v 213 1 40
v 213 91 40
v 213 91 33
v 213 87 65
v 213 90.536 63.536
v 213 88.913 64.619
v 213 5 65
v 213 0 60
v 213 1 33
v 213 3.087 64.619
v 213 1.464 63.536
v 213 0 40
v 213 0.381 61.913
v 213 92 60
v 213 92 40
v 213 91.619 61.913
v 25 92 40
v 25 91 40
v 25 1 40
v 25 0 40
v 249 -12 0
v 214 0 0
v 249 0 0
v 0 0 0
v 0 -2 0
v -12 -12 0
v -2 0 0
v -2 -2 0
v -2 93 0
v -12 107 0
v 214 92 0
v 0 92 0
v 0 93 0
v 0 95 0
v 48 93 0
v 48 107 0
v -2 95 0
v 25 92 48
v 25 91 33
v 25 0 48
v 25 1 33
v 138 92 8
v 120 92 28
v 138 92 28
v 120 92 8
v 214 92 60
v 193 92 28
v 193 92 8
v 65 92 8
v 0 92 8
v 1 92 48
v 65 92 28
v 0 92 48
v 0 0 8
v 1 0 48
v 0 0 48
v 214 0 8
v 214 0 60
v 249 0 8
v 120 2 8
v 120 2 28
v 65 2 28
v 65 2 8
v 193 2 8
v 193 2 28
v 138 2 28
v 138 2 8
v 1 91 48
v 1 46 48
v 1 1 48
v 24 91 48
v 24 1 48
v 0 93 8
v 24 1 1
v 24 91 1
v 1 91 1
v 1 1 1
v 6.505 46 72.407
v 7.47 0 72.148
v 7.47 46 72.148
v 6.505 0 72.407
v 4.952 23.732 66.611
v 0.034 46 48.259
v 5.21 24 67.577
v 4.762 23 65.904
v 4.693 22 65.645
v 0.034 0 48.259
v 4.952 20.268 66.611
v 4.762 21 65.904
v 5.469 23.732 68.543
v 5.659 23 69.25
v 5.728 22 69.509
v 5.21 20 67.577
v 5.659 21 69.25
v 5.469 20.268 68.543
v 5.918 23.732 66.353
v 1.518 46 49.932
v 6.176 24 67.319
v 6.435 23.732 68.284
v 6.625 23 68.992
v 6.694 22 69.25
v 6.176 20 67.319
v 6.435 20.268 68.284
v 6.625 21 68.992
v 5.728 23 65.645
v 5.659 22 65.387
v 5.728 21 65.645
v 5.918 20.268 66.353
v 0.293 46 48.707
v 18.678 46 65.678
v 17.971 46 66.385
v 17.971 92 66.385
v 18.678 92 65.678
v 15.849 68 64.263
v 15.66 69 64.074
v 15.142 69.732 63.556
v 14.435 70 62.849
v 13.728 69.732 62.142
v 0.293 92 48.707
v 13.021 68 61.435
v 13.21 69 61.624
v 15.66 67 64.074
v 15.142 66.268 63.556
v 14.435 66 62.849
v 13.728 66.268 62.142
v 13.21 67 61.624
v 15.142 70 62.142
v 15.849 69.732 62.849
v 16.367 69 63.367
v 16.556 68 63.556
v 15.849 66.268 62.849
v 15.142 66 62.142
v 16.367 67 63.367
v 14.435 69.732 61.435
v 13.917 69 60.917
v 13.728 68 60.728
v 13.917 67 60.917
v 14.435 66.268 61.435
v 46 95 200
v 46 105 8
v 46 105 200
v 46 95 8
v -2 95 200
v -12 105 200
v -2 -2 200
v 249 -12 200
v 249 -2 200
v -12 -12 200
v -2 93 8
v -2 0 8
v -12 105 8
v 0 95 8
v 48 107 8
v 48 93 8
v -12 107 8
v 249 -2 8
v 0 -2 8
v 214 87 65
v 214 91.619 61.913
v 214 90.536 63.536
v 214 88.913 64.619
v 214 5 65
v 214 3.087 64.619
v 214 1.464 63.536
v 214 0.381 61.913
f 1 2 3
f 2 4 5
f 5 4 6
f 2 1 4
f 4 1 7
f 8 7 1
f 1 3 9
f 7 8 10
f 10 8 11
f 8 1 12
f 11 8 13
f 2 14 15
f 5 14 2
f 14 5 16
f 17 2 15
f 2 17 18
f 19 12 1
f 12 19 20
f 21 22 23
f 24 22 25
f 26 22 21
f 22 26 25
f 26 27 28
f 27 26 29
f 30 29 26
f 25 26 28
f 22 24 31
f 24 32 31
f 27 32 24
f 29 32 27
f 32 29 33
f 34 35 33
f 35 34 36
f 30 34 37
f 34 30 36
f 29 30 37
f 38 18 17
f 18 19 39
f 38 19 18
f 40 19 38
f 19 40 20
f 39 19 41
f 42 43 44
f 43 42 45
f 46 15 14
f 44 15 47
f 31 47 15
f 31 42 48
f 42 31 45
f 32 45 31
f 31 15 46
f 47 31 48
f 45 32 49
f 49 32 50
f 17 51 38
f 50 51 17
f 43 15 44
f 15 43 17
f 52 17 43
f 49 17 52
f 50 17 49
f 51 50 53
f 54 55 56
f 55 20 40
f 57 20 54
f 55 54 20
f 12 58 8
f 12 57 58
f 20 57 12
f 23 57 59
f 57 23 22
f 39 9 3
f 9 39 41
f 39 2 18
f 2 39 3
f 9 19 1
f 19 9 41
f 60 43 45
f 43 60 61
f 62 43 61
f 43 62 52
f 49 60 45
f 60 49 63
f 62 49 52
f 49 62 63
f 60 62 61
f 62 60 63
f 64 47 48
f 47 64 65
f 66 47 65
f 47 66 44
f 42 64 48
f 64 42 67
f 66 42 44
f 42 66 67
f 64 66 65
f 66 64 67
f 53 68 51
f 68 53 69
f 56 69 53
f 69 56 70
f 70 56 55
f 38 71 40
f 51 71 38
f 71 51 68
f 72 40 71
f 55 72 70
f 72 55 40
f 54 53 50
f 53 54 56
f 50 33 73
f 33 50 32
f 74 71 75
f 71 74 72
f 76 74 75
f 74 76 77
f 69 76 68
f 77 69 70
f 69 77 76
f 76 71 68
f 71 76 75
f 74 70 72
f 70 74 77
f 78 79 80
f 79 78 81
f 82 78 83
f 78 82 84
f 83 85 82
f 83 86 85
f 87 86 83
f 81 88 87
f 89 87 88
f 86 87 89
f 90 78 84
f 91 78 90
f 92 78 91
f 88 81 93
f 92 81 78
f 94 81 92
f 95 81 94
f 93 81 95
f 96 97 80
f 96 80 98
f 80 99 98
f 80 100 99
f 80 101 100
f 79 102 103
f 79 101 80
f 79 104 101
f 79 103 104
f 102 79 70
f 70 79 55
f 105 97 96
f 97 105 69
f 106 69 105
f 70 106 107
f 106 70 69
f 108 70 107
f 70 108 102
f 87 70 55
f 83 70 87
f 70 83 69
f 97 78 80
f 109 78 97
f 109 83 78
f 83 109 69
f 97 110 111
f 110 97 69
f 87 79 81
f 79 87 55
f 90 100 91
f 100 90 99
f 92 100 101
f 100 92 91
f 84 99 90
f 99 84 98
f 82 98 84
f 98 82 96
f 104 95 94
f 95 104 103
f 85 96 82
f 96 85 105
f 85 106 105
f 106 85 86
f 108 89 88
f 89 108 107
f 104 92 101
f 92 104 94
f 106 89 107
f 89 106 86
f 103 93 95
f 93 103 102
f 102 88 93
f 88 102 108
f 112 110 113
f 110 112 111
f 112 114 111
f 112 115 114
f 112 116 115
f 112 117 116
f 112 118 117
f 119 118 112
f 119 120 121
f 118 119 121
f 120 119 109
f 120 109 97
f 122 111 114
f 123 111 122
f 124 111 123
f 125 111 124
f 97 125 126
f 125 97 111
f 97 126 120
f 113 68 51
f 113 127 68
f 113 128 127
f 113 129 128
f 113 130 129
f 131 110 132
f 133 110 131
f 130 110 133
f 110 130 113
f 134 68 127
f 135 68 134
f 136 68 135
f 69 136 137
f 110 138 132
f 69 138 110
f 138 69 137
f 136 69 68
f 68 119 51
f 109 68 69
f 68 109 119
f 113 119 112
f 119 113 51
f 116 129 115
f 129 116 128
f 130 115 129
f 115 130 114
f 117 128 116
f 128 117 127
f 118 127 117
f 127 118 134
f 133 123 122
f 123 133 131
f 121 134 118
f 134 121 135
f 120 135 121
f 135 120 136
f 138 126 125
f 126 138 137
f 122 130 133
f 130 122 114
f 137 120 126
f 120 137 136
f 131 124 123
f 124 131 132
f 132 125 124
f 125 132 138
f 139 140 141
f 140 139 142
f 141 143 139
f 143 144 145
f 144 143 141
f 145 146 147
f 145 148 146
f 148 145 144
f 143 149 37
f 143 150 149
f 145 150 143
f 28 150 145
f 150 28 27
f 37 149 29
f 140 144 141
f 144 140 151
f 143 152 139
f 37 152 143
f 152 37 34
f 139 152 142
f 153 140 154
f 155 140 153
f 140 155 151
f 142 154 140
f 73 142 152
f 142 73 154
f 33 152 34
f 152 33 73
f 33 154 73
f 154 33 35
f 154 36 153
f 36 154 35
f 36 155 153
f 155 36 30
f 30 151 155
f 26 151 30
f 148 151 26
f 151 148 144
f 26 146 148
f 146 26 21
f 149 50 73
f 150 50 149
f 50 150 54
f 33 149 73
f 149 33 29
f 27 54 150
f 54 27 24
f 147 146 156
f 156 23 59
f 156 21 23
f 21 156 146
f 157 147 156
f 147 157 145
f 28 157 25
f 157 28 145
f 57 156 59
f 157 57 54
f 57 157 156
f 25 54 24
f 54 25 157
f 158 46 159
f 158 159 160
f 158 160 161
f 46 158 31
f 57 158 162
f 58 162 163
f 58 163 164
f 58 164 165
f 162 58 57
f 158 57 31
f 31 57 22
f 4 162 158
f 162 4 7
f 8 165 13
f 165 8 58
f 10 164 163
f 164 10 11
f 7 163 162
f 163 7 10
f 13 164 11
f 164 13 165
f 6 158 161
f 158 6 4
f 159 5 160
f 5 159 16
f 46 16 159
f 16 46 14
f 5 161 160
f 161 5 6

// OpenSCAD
//$vpr = [60,0,135];
//$vpt = [50,0,0];

// cama gaveiteiro
difference () {
    translate([25, 0, 0])
        cube([188, 92, 40]);

    // caixa para o colchão
    translate([24, 1, 33])
        cube([192, 90, 40]);

    // gaveta direita
    translate([65, 2, 8])
        cube([55, 91, 20]);

    // gaveta esquerda
    translate([138, 2, 8])
        cube([55, 91, 20]);
}


// baú cabeceira
color([0, 1, 0])
    difference () {
        cube([25, 92, 48]);
        translate([1, 1, 1])
            cube([23, 90, 48]);
    }

// tampa 1 (mais aberta)
color([0, 0, 1])
    translate([1,0,48])
        rotate([0, -75, 0])
            difference() {
                cube([25,46,1]);
                translate([20,22,-1])
                    cylinder($fn=12, 3, 2, 2);
            }

// tampa 2
color([0, 0, 1])
    translate([1,46,48])
        rotate([0, -45, 0])
            difference() {
                cube([25,46,1]);
                    translate([20,22,-1])
                    cylinder($fn=12, 3, 2, 2);
            }                

// peseira: retângulo largura
color([1, 0, 0])
    translate([213, 0, 0])
        cube([1,92, 60]);

// peseira: retângulo altura
color([1, 0, 0])
    translate([213, 5, 0])
        cube([1,82, 65]);

// peseira: canto 1
color([1, 0, 0])
    rotate([0,90,0])
        translate([-60,5,213])
            cylinder(1, 5, 5);

// peseira: canto 1
color([1, 0, 0])
    rotate([0,90,0])
        translate([-60,87,213])
            cylinder(1, 5, 5);
// paredes
union() {
    // parede interna do nicho
    color([1, 1, 1, 0.5])
        translate([-2,95,0])
            cube([48, 10, 200]);

    // rodapé interno do nicho
    color([1, 1, 1])
        translate([0, 93, 0])
            cube([46, 2,8]);

    color([1, 1, 1])
        translate([46, 93, 0])
            cube([2, 14, 8]);

    color([1, 1, 1])
        translate([-12, 105, 0])
            cube([58, 2, 8]);

    // parede do fundo
    color([1, 1, 1, 0.5])
        translate([-12,-12,0])
            cube([10, 117, 200]);

    // rodapé do fundo
    color([1, 1, 1])
        translate([-2, 0, 0])
            cube([2, 93,8]);
            
    // parede externa
    color([1, 1, 1, 0.5])
        translate([-2,-12,0])
            cube([251, 10, 200]);

    // rodapé externo
    color([1, 1, 1])
        translate([0,-2, 0])
            cube([249, 2, 8]);
}
